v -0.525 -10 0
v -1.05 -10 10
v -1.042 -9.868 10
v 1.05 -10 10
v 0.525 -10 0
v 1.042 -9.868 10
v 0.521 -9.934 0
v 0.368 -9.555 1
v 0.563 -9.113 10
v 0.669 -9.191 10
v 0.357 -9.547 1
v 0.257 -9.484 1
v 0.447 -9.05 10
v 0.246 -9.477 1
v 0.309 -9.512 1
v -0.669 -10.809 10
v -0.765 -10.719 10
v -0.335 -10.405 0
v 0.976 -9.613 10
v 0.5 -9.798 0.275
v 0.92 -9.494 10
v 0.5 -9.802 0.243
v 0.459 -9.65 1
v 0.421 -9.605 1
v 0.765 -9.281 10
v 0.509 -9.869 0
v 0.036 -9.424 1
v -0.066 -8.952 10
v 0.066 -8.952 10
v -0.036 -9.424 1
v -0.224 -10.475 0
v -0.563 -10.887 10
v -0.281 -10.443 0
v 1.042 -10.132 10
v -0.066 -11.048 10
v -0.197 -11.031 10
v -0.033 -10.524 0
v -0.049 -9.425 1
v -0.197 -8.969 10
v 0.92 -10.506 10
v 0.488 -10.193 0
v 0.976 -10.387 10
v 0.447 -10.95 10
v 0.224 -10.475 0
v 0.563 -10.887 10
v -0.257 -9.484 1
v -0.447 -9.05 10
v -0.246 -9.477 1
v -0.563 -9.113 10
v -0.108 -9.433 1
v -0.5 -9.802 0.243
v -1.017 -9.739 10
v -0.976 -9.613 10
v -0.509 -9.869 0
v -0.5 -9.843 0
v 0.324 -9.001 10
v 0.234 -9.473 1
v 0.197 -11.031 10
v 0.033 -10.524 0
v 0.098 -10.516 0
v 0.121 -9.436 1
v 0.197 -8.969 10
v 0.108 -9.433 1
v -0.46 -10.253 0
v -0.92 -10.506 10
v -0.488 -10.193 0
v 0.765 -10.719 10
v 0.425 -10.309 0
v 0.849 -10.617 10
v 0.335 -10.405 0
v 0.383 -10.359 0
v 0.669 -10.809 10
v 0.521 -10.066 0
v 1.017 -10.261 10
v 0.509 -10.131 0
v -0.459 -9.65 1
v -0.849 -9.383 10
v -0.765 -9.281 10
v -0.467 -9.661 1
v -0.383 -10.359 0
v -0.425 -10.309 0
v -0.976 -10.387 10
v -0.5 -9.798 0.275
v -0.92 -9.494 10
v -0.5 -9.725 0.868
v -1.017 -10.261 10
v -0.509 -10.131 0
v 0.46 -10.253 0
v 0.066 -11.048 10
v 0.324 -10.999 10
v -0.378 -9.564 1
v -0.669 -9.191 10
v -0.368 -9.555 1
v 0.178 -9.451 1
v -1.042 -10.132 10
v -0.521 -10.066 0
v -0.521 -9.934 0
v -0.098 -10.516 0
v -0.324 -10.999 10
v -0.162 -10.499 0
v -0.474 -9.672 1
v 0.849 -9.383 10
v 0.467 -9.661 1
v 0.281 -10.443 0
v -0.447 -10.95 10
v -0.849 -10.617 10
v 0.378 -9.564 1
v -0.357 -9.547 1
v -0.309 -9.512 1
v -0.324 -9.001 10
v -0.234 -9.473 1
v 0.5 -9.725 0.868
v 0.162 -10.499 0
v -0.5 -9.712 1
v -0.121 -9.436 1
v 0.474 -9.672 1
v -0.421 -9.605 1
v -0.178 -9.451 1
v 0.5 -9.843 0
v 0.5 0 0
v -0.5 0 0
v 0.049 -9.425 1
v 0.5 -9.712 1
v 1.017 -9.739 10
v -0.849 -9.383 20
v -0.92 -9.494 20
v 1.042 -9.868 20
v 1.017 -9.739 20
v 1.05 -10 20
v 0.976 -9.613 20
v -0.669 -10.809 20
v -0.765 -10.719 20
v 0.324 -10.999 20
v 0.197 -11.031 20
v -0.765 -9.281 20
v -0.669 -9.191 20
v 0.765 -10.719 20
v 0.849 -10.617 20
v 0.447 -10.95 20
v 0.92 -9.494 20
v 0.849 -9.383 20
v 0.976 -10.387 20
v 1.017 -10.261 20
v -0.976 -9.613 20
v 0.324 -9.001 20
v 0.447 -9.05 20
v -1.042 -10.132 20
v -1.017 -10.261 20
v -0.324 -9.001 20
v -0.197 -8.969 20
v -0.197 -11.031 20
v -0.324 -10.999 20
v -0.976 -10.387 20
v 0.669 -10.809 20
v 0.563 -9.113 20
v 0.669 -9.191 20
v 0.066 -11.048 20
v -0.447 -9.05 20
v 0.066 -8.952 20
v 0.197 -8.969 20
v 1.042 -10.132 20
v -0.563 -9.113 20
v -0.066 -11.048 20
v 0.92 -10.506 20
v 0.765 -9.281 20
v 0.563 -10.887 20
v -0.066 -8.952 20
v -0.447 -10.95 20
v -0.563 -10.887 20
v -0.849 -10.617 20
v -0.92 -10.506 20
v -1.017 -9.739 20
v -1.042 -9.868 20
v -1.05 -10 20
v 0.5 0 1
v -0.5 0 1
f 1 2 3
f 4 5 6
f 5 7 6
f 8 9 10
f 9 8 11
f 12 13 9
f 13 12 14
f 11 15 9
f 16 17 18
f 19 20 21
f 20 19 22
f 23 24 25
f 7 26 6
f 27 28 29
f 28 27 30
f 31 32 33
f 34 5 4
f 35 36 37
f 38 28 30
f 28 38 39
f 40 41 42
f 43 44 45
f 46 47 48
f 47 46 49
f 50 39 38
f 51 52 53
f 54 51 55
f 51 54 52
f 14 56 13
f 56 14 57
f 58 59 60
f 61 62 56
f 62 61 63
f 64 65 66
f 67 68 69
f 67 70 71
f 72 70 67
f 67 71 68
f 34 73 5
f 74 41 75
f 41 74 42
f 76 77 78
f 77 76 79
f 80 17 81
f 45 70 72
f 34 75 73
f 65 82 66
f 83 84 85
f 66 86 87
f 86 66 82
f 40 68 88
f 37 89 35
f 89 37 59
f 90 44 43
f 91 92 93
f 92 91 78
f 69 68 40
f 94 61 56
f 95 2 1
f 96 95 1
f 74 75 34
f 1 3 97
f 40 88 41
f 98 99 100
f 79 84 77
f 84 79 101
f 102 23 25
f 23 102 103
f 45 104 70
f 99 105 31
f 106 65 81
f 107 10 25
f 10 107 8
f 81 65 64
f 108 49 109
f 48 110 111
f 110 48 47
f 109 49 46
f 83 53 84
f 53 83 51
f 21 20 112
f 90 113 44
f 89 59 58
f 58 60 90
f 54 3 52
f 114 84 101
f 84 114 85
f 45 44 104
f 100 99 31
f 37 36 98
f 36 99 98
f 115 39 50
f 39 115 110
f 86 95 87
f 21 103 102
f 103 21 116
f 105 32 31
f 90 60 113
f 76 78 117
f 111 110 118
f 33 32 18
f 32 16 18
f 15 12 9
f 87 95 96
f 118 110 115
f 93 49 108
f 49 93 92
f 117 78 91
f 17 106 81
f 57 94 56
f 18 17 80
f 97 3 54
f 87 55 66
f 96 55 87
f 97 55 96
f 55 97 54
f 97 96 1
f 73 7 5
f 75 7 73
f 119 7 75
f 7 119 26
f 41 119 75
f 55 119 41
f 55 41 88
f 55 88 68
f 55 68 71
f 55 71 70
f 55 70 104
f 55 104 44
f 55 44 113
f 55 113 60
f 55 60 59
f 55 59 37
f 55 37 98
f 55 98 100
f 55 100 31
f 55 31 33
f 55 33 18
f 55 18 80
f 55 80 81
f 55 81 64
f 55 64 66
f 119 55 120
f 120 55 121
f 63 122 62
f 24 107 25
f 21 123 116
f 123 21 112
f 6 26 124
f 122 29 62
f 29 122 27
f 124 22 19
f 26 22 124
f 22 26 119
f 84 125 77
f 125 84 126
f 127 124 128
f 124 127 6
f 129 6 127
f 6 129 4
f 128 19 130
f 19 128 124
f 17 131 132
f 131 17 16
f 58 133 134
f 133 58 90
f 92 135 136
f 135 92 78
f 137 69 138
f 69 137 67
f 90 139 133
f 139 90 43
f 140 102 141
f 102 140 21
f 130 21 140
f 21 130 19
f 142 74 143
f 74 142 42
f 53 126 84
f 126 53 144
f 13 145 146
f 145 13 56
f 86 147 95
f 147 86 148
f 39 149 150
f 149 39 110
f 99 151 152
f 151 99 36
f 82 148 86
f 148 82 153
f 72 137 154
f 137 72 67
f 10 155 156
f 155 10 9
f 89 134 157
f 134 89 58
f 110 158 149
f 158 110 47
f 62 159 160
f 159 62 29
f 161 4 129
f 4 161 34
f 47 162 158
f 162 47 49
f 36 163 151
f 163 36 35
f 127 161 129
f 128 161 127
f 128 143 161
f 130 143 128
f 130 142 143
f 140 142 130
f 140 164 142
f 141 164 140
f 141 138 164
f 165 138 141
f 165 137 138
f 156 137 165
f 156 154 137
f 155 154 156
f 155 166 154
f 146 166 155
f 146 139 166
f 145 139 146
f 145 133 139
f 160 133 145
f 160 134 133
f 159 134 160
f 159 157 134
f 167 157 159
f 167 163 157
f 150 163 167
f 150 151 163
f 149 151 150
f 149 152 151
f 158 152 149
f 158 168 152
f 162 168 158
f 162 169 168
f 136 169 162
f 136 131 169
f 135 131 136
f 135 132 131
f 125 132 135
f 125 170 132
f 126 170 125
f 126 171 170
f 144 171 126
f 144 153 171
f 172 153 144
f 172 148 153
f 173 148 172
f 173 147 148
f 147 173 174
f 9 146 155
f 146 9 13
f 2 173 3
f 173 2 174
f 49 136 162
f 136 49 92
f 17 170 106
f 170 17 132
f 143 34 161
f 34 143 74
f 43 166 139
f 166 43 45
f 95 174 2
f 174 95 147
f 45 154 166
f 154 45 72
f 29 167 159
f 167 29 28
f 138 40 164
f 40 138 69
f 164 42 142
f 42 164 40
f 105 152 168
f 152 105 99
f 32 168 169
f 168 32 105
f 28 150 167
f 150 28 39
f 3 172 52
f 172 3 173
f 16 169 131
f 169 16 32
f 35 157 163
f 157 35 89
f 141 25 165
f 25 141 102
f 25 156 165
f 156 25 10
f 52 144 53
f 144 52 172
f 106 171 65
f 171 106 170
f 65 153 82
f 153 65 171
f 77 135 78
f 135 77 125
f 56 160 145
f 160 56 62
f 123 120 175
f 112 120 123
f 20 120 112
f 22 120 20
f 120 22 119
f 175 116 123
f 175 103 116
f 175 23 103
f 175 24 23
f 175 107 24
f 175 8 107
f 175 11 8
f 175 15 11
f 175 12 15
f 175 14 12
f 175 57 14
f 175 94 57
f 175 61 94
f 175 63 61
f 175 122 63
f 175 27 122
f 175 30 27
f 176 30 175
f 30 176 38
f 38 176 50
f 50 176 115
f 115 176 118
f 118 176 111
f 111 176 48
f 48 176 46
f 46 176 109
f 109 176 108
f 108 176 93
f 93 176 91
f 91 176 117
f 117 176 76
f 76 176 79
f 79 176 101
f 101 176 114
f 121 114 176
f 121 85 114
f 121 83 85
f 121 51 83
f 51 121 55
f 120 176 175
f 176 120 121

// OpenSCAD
H_inlet1 = 10;
H_inlet2 = 10;
W = 0.5;
R_inlet1 = W;
R_inlet2 = 1.05;
W_wall = 2.5;
inletNumber = 5;
channelLenght = 10;
//inletWidth = 1;

module inlet(inletNumber, channelLenght, inletWidth, R_inlet2){

module tubeConnection(){
cylinder (h = H_inlet1, r1 = R_inlet2/2, r2 = R_inlet2, center = false, $fn=50); //входное отверстие
translate ([0, 0, H_inlet1]) cylinder (h = H_inlet2, r = R_inlet2, center = false, $fn=50); //входное отверстие
};

if (inletNumber == 1) {
union (){
translate([0, -channelLenght,0]) tubeConnection();
translate ([-inletWidth/2, -channelLenght,0]) cube ([inletWidth, channelLenght, 1]);
}
}
if (inletNumber/2 == round(inletNumber/2) && inletNumber != 1) {
union (){
    translate ([-inletWidth/2, -channelLenght,0]) cube ([inletWidth, channelLenght, 1]);
    for (i=[1:(inletNumber/2)]){
        translate ([-inletWidth/2, -channelLenght*i,0]) cube ([inletWidth, channelLenght, 1]);
        translate ([-channelLenght/2, -(channelLenght*i)-(inletWidth/2),0]) cube ([channelLenght, inletWidth, 1]);
        translate ([-channelLenght/2, -(channelLenght*i),0]) tubeConnection();
        translate ([channelLenght/2, -(channelLenght*i),0]) tubeConnection();
    }
}   
}

if (inletNumber/2 != round(inletNumber/2) && inletNumber != 1) {
union (){
    translate ([-inletWidth/2, -channelLenght*((inletNumber)/2),0]) cube ([inletWidth, channelLenght, inletWidth]);
    translate ([0, -channelLenght*((inletNumber)/2),0]) tubeConnection();
    for (i=[1:(inletNumber/2)]){
        translate ([-inletWidth/2, -channelLenght*i,0]) cube ([inletWidth, channelLenght, inletWidth]);
        translate ([-channelLenght/2, -(channelLenght*i)-(inletWidth/2),0]) cube ([channelLenght, inletWidth, inletWidth]);
        translate ([-channelLenght/2, -(channelLenght*i),0]) tubeConnection();
        translate ([channelLenght/2, -(channelLenght*i),0]) tubeConnection();
    }
}   
}
}

inlet (1, 10, 1, 1.05);
